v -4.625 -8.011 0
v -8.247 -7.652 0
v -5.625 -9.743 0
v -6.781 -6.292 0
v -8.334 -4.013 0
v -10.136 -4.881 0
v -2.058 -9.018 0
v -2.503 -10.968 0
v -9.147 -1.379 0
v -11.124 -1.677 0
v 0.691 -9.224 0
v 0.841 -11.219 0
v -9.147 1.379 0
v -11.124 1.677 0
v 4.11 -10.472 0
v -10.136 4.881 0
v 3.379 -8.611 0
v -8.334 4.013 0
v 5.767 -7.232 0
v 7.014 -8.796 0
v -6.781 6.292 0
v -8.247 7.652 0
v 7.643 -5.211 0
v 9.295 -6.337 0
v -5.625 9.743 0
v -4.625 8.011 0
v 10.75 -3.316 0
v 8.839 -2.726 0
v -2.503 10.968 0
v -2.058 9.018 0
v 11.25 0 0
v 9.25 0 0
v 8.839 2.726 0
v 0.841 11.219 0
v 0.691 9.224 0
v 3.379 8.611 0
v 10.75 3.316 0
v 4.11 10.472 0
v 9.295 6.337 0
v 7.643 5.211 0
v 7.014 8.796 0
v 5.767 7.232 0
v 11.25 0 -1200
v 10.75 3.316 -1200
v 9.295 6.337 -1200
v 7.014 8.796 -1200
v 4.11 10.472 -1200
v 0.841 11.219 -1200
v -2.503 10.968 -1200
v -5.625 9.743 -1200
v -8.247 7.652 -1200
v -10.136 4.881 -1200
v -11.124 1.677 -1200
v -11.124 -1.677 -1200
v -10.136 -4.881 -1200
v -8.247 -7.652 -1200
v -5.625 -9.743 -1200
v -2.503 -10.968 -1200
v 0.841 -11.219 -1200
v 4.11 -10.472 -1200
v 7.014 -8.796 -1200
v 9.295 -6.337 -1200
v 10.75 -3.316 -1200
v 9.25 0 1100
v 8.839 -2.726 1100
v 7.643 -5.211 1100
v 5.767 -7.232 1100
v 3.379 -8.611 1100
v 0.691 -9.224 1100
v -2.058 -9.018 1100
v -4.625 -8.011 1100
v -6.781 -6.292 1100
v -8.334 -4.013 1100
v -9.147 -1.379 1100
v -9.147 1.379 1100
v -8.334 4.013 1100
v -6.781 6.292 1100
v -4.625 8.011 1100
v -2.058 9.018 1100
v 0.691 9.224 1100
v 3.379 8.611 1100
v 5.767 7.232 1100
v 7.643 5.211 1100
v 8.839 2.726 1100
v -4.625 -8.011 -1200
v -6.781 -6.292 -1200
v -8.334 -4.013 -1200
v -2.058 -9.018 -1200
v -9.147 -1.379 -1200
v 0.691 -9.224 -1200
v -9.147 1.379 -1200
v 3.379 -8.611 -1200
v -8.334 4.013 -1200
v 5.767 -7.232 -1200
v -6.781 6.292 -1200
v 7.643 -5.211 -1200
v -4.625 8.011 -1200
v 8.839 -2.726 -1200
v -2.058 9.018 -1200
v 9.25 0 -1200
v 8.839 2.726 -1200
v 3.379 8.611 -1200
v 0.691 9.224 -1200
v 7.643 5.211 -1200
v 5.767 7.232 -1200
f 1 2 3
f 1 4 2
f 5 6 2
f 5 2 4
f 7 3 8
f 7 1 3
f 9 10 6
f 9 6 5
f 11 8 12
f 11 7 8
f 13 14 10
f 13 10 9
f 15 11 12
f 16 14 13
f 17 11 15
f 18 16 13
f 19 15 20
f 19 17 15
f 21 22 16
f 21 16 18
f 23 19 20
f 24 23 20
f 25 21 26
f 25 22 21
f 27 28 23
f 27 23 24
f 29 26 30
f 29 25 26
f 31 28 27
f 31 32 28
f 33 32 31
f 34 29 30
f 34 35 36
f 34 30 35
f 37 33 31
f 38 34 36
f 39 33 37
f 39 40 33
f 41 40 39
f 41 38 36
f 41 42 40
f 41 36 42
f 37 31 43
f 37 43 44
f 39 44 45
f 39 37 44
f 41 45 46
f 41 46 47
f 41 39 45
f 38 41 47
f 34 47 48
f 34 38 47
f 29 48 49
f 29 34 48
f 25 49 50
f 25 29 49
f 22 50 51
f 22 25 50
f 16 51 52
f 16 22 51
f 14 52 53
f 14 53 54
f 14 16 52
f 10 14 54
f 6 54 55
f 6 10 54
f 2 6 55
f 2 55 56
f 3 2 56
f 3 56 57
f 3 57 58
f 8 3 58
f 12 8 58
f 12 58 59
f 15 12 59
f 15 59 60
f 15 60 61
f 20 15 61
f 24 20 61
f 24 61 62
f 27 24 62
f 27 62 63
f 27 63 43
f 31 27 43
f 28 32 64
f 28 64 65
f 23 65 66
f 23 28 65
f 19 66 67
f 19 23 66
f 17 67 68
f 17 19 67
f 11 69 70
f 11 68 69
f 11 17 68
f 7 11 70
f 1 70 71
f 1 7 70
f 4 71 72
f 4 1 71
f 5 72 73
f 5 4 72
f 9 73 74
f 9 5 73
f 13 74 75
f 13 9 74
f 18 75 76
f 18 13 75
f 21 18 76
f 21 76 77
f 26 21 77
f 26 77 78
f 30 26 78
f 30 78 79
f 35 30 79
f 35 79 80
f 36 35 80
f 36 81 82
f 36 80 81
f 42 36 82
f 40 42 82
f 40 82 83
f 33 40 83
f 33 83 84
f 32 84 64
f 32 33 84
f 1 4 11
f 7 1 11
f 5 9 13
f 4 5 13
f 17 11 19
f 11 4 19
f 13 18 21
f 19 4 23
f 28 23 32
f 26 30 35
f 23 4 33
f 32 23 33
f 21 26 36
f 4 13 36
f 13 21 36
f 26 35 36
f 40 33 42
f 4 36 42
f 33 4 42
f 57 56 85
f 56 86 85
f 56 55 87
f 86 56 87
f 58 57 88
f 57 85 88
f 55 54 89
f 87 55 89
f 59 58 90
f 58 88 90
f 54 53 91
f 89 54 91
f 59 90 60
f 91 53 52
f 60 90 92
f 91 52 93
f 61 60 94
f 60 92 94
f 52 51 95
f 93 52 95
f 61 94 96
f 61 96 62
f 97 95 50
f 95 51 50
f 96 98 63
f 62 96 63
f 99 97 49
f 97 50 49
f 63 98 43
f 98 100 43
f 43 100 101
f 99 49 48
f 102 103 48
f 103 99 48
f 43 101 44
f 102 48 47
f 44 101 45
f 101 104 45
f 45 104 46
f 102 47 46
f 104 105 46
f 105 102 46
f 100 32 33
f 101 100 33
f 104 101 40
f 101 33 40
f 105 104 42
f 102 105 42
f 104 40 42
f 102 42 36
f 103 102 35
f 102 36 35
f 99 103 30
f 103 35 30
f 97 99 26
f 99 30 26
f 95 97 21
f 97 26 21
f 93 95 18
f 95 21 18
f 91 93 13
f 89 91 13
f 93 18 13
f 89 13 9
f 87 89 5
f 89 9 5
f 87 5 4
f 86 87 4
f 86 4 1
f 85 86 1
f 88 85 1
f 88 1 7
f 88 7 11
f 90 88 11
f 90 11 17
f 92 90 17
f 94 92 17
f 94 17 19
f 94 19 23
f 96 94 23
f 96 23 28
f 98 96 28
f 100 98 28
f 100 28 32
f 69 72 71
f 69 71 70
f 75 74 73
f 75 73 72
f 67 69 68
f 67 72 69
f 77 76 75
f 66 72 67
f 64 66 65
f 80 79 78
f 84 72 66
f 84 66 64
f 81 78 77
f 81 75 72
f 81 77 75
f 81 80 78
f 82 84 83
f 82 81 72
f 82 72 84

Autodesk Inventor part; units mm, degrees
ref_plane "YZ Plane" through (0, 0, 0) normal (1, 0, 0) x (0, 1, 0)
ref_plane "XZ Plane" through (0, 0, 0) normal (0, 1, 0) x (-1, 0, 0)
ref_plane "XY Plane" through (0, 0, 0) normal (0, 0, 1) x (1, 0, 0)
sketch "스케치1" plane through (0, 0, 0) normal (0, 0, 1) x (1, 0, 0)
  circle A0 centre (0, 0) radius 11.25
  circle A1 centre (0, 0) radius 9.25
  dimension "d0" = 22.5
  dimension "d1" = 18.5
extrude "돌출1" add sketch "스케치1" along normal blind 1100 contours A1
extrude "돌출2" add sketch "스케치1" against normal blind 1200
properties part number "커튼 봉"
